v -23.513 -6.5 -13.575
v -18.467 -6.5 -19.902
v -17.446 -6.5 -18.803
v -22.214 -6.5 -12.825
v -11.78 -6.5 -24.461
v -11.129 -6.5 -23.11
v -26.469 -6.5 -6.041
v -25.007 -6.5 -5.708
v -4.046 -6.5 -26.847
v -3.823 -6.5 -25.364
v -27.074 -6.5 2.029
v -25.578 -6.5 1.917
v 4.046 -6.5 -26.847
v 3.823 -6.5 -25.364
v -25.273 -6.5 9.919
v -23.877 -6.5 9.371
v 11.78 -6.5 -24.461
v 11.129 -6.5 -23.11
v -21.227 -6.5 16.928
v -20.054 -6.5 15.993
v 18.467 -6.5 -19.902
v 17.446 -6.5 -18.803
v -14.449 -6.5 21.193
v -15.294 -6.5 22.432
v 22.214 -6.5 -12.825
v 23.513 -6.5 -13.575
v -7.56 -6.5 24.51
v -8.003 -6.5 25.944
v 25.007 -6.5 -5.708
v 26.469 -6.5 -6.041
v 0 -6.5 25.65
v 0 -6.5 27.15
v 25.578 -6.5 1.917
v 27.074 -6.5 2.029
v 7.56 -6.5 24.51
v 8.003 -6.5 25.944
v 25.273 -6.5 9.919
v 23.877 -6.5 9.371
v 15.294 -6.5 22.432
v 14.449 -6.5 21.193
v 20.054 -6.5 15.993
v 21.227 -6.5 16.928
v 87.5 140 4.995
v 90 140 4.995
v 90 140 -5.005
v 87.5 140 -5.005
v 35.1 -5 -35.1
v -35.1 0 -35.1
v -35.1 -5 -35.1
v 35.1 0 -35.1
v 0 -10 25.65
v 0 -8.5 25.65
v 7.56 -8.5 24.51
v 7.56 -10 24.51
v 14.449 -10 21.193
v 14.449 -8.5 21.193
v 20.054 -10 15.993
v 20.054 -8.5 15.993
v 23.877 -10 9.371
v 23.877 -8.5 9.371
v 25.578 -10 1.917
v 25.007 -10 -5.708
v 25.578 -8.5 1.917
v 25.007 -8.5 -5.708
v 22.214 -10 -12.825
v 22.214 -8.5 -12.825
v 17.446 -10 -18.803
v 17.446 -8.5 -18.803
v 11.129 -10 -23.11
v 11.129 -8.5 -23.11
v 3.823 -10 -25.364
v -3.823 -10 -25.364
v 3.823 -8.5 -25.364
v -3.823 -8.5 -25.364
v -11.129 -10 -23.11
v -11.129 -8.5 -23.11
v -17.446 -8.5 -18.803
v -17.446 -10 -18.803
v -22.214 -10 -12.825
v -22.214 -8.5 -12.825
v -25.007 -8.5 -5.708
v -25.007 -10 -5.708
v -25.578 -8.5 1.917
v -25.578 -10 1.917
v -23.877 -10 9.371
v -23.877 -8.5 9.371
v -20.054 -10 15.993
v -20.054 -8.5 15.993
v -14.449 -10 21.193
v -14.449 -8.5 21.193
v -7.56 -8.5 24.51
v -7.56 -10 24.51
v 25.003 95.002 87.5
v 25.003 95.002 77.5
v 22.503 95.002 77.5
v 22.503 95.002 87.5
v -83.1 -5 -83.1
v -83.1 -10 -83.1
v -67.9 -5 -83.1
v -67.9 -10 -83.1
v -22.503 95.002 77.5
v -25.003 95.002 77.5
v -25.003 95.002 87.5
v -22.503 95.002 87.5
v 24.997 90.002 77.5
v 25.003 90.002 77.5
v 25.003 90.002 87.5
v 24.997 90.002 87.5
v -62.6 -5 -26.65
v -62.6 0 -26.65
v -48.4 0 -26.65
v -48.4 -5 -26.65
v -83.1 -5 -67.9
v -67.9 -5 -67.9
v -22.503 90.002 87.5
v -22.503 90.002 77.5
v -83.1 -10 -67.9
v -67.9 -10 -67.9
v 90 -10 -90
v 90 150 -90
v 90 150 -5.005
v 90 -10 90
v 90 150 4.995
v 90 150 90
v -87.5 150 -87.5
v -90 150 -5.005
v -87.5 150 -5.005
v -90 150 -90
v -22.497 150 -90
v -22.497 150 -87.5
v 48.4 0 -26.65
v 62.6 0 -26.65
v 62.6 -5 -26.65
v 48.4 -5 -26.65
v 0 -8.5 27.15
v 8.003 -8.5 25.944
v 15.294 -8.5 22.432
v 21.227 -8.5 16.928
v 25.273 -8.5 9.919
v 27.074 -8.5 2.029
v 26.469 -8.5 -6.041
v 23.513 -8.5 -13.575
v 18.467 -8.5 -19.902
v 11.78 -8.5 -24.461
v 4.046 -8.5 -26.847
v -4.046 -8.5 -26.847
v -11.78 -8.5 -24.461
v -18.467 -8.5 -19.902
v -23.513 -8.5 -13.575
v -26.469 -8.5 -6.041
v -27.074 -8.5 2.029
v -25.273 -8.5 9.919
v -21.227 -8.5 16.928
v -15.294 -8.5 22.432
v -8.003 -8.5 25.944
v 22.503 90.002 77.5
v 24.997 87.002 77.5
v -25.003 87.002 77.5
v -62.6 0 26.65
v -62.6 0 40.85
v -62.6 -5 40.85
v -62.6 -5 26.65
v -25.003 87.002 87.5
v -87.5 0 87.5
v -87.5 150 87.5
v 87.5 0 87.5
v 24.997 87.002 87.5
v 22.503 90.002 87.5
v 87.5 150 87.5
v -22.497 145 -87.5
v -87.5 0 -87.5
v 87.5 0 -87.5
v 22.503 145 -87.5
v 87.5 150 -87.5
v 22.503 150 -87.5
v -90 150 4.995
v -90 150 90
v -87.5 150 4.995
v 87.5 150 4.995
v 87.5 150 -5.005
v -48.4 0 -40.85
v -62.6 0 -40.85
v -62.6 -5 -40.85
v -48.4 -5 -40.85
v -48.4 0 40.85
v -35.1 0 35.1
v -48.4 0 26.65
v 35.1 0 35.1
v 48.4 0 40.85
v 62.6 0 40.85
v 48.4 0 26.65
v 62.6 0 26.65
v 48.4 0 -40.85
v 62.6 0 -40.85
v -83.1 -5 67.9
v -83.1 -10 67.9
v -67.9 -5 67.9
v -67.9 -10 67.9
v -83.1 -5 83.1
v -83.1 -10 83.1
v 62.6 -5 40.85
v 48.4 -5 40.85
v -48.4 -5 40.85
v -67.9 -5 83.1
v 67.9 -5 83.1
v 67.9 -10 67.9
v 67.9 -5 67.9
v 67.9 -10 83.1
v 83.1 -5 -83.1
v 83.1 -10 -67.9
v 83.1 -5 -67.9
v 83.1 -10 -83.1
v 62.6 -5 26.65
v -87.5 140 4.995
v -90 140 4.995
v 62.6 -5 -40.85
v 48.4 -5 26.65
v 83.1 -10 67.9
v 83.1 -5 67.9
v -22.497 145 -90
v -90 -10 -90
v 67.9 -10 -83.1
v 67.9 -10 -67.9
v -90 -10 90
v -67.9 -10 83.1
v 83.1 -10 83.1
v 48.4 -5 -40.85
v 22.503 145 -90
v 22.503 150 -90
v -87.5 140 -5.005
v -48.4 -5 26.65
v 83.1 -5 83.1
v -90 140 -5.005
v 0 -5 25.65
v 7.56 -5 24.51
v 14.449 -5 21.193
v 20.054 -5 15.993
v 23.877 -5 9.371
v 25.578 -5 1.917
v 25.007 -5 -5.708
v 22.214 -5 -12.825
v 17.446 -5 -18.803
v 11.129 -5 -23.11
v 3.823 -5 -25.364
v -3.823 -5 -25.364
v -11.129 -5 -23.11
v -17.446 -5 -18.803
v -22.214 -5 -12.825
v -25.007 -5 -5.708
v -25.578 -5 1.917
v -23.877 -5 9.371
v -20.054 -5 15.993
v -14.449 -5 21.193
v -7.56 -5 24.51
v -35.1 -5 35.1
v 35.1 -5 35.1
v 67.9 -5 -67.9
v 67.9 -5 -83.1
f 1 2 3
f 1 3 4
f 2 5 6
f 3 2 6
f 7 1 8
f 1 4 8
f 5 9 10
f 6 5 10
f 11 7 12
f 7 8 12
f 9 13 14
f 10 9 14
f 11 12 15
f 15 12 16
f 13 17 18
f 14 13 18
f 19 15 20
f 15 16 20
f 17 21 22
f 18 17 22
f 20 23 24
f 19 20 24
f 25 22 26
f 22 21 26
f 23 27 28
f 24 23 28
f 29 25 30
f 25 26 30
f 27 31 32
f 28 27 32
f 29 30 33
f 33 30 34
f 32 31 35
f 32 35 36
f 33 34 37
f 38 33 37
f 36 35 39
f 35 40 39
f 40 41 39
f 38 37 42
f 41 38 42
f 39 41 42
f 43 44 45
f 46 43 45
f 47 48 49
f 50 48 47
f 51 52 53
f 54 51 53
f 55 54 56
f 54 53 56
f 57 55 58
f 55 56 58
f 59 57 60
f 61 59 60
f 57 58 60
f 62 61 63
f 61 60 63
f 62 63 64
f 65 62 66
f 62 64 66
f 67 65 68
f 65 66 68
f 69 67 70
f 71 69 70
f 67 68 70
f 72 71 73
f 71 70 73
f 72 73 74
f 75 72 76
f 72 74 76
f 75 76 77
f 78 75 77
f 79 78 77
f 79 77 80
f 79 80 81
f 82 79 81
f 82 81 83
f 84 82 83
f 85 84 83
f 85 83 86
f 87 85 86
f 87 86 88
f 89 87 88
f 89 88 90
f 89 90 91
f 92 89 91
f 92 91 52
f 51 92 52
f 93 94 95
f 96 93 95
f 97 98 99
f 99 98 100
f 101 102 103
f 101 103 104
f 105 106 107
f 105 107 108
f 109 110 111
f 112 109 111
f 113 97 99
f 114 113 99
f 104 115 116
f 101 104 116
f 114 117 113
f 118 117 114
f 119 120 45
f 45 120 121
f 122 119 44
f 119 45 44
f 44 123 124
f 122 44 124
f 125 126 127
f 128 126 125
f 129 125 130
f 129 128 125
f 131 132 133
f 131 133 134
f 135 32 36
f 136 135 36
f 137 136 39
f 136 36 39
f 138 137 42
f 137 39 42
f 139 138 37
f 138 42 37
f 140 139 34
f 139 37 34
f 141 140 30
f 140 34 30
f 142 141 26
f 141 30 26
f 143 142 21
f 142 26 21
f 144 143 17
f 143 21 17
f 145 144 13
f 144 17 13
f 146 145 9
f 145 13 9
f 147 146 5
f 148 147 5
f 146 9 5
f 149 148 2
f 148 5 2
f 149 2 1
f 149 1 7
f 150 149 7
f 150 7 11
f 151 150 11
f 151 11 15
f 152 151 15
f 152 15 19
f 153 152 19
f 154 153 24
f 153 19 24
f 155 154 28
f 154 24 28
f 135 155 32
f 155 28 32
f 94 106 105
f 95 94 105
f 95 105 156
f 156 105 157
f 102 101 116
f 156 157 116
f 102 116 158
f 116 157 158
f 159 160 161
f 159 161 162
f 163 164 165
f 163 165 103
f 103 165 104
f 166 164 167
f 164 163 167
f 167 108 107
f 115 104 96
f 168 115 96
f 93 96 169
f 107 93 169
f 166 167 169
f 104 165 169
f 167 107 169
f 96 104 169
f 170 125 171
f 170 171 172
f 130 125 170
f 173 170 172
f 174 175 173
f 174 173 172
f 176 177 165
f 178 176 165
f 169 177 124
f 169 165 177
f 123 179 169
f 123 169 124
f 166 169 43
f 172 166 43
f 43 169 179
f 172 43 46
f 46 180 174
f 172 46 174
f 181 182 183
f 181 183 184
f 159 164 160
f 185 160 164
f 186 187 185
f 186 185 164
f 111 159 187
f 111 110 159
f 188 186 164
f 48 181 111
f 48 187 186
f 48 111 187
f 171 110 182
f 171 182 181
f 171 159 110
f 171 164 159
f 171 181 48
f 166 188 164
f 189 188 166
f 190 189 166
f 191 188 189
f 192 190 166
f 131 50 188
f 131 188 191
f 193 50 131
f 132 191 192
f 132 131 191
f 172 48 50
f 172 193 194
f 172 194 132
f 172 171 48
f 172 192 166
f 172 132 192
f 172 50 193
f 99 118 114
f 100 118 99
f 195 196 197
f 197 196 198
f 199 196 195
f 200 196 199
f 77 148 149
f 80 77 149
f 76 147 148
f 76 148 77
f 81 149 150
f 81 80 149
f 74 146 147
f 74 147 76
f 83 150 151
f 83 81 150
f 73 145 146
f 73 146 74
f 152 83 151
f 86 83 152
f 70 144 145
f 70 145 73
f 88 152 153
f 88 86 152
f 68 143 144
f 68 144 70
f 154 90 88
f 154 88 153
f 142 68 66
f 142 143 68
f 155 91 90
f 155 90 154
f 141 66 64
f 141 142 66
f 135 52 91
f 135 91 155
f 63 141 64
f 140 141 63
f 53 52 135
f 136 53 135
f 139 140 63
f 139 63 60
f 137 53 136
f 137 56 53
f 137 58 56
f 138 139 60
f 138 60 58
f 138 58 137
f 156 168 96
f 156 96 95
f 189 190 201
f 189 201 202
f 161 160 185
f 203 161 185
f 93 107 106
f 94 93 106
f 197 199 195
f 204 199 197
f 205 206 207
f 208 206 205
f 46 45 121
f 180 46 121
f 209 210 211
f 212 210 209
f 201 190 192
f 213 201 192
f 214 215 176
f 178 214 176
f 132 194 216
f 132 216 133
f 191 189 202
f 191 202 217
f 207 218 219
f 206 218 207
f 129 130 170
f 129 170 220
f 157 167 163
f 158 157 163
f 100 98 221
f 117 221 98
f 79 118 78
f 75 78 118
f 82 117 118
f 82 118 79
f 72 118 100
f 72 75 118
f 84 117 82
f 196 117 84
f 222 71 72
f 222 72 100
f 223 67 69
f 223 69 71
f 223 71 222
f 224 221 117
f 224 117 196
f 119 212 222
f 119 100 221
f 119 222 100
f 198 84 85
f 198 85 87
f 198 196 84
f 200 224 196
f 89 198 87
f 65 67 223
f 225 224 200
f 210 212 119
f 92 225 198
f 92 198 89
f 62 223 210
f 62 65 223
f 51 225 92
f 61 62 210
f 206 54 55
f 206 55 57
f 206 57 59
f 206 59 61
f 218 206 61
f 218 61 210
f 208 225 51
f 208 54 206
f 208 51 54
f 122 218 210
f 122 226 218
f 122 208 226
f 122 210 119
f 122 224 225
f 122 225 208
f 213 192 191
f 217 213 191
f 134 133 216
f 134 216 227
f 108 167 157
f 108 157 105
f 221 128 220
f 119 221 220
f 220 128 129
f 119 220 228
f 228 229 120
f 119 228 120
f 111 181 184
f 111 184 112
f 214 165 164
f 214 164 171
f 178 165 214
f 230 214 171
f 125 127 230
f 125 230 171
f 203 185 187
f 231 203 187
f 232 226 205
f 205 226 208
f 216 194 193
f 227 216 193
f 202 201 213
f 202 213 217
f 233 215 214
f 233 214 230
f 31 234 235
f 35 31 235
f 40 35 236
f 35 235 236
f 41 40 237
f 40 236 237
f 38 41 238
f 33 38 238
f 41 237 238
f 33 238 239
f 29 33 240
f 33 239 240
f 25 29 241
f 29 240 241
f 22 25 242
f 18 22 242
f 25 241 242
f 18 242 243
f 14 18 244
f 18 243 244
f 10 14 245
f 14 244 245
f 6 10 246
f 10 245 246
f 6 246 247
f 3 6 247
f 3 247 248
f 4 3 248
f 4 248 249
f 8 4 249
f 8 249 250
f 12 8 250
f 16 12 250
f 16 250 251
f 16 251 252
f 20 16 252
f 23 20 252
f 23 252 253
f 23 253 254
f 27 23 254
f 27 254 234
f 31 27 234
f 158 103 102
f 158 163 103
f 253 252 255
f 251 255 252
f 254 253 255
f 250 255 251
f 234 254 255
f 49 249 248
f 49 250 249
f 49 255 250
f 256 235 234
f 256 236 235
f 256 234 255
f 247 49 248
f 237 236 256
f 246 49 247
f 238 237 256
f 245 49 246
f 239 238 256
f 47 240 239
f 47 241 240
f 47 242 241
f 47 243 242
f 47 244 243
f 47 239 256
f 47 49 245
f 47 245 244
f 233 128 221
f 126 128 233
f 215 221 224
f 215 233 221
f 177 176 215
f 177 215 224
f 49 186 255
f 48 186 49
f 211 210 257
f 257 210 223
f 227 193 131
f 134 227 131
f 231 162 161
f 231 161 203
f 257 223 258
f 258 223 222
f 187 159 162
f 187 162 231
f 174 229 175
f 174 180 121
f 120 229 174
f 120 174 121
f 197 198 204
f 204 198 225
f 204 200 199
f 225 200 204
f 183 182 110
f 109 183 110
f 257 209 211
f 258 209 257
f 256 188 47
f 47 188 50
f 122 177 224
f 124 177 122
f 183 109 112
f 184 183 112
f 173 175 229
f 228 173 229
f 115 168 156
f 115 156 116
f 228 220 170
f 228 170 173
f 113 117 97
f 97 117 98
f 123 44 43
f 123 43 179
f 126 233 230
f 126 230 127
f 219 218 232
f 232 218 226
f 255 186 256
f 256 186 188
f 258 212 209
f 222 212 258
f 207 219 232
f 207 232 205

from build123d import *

# Parameters (mm, degrees)
BOSS_EXTRUDE1_DEPTH      = 150
BOSS_EXTRUDE1_DEPTH_BACK = 5
SKETCH1_W                = 180
SKETCH1_H                = 180
SKETCH6_W                = 175
SKETCH6_H                = 175
CUT_EXTRUDE2_DEPTH       = 150
SKETCH34_W               = 180
SKETCH34_H               = 180
BOSS_EXTRUDE14_DEPTH     = 5
SKETCH35_W               = 15.2
SKETCH35_H               = 15.2
CUT_EXTRUDE11_DEPTH      = 5
SKETCH37_W               = 14.2
SKETCH37_H               = 14.2
CUT_EXTRUDE12_DEPTH      = 5
MIRROR13_COPY_1_SKETCH_W = 15.2
MIRROR13_COPY_1_SKETCH_H = 15.2
MIRROR13_COPY_1_DEPTH    = 5
MIRROR13_COPY_2_SKETCH_W = 14.2
MIRROR13_COPY_2_SKETCH_H = 14.2
MIRROR13_COPY_2_DEPTH    = 5
SKETCH15_W               = 10
SKETCH15_H               = 10
CUT_EXTRUDE7_DEPTH       = 3
SKETCH21_W               = 50
SKETCH21_H               = 3
BOSS_EXTRUDE7_DEPTH      = 10
SKETCH22_W               = 2.5
SKETCH22_H               = 10
BOSS_EXTRUDE8_DEPTH      = 5
SKETCH30_W               = 45
SKETCH30_H               = 2.5
CUT_EXTRUDE9_DEPTH       = 5
SKETCH38_W               = 70.2
SKETCH38_H               = 70.2
CUT_EXTRUDE13_DEPTH      = 5
SKETCH7_R                = 25.65
CUT_EXTRUDE14_DEPTH      = 5
CUT_EXTRUDE16_START      = -1.5
SKETCH39_R               = 27.15
CUT_EXTRUDE16_DEPTH      = 2


with BuildPart() as part:
    # Sketch1 → Boss-Extrude1 (new, two sides: drawn at the far end of the back side and taken through both)
    with BuildSketch(Plane(origin=(0, 0, 0), x_dir=(1, 0, 0), z_dir=(0, 1, 0)).offset(-BOSS_EXTRUDE1_DEPTH_BACK)):
        Rectangle(SKETCH1_W, SKETCH1_H)
    extrude(amount=BOSS_EXTRUDE1_DEPTH + BOSS_EXTRUDE1_DEPTH_BACK)

    # Sketch6 → Cut-Extrude2 (cut)
    with BuildSketch(Plane(origin=(0, 150, 0), x_dir=(1, 0, 0), z_dir=(0, 1, 0))):
        Rectangle(SKETCH6_W, SKETCH6_H)
    extrude(amount=-CUT_EXTRUDE2_DEPTH, mode=Mode.SUBTRACT)

    # Sketch34 → Boss-Extrude14 (add)
    with BuildSketch(Plane.XZ.offset(5)):
        Rectangle(SKETCH34_W, SKETCH34_H)
    extrude(amount=BOSS_EXTRUDE14_DEPTH)

    # Sketch35 → Cut-Extrude11 (cut)
    with BuildSketch(Plane.XZ.offset(10)):
        with Locations((-75.5, 75.5)):
            Rectangle(SKETCH35_W, SKETCH35_H)
    cut_extrude11 = extrude(amount=-CUT_EXTRUDE11_DEPTH, mode=Mode.SUBTRACT)

    # Sketch37 → Cut-Extrude12 (cut)
    with BuildSketch(Plane(origin=(0, 0, 0), x_dir=(1, 0, 0), z_dir=(0, 1, 0))):
        with Locations((-55.5, -33.75)):
            Rectangle(SKETCH37_W, SKETCH37_H)
    cut_extrude12 = extrude(amount=-CUT_EXTRUDE12_DEPTH, mode=Mode.SUBTRACT)

    # Mirror12: Cut-Extrude11, Cut-Extrude12 across plane
    add(cut_extrude11.mirror(Plane.XY), mode=Mode.SUBTRACT)
    add(cut_extrude12.mirror(Plane.XY), mode=Mode.SUBTRACT)

    # Mirror13: Cut-Extrude11, Cut-Extrude12 across plane
    add(cut_extrude11.mirror(Plane(origin=(0, 0, 0), x_dir=(0, 0, 1), z_dir=(1, 0, 0))), mode=Mode.SUBTRACT)
    add(cut_extrude12.mirror(Plane(origin=(0, 0, 0), x_dir=(0, 0, 1), z_dir=(1, 0, 0))), mode=Mode.SUBTRACT)

    # Mirror13 copy 1 sketch → Mirror13 copy 1 (cut)
    with BuildSketch(Plane(origin=(0, -10, 0), x_dir=(-1, 0, 0), z_dir=(0, -1, 0))):
        with Locations((-75.5, 75.5)):
            Rectangle(MIRROR13_COPY_1_SKETCH_W, MIRROR13_COPY_1_SKETCH_H)
    extrude(amount=-MIRROR13_COPY_1_DEPTH, mode=Mode.SUBTRACT)

    # Mirror13 copy 2 sketch → Mirror13 copy 2 (cut)
    with BuildSketch(Plane(origin=(0, 0, 0), x_dir=(-1, 0, 0), z_dir=(0, 1, 0))):
        with Locations((-55.5, -33.75)):
            Rectangle(MIRROR13_COPY_2_SKETCH_W, MIRROR13_COPY_2_SKETCH_H)
    extrude(amount=-MIRROR13_COPY_2_DEPTH, mode=Mode.SUBTRACT)

    # Sketch15 → Cut-Extrude7 (cut)
    with BuildSketch(Plane(origin=(90, 0, 0), x_dir=(0, 0, -1), z_dir=(1, 0, 0))):
        with Locations((0.004832502, 145)):
            Rectangle(SKETCH15_W, SKETCH15_H)
    cut_extrude7 = extrude(amount=-CUT_EXTRUDE7_DEPTH, mode=Mode.SUBTRACT)

    # Mirror3: Cut-Extrude7 across plane
    add(cut_extrude7.mirror(Plane(origin=(0, 0, 0), x_dir=(0, 0, 1), z_dir=(1, 0, 0))), mode=Mode.SUBTRACT)

    # Sketch21 → Boss-Extrude7 (add)
    with BuildSketch(Plane(origin=(0, 0, 87.5), x_dir=(-1, 0, 0), z_dir=(0, 0, -1))):
        with Locations((0.003304144, 88.502007714)):
            Rectangle(SKETCH21_W, SKETCH21_H)
    extrude(amount=BOSS_EXTRUDE7_DEPTH)

    # Sketch22 → Boss-Extrude8 (add)
    with BuildSketch(Plane(origin=(0, 90.002007714, 0), x_dir=(1, 0, 0), z_dir=(0, 1, 0))):
        with Locations((-23.753304144, -82.5)):
            Rectangle(SKETCH22_W, SKETCH22_H)
    boss_extrude8 = extrude(amount=BOSS_EXTRUDE8_DEPTH)

    # Mirror7: Boss-Extrude8 across plane
    add(boss_extrude8.mirror(Plane(origin=(0, 0, 0), x_dir=(0, 0, 1), z_dir=(1, 0, 0))))

    # Sketch30 → Cut-Extrude9 (cut)
    with BuildSketch(Plane(origin=(0, 150, 0), x_dir=(1, 0, 0), z_dir=(0, 1, 0))):
        with Locations((0.002512985, 88.75)):
            Rectangle(SKETCH30_W, SKETCH30_H)
    extrude(amount=-CUT_EXTRUDE9_DEPTH, mode=Mode.SUBTRACT)

    # Sketch38 → Cut-Extrude13 (cut)
    with BuildSketch(Plane(origin=(0, 0, 0), x_dir=(1, 0, 0), z_dir=(0, 1, 0))):
        Rectangle(SKETCH38_W, SKETCH38_H)
    extrude(amount=-CUT_EXTRUDE13_DEPTH, mode=Mode.SUBTRACT)

    # Sketch7 → Cut-Extrude14 (cut)
    with BuildSketch(Plane(origin=(0, -5, 0), x_dir=(1, 0, 0), z_dir=(0, 1, 0))):
        with Locations(Location((0, 0, 0), (0, 0, 270))):
            Circle(SKETCH7_R)
    extrude(amount=-CUT_EXTRUDE14_DEPTH, mode=Mode.SUBTRACT)

    # Sketch39 → Cut-Extrude16 (cut)
    with BuildSketch(Plane(origin=(0, -5, 0), x_dir=(1, 0, 0), z_dir=(0, 1, 0)).offset(CUT_EXTRUDE16_START)):
        with Locations(Location((0, 0, 0), (0, 0, 270))):
            Circle(SKETCH39_R)
    extrude(amount=-CUT_EXTRUDE16_DEPTH, mode=Mode.SUBTRACT)


solid = part.part
